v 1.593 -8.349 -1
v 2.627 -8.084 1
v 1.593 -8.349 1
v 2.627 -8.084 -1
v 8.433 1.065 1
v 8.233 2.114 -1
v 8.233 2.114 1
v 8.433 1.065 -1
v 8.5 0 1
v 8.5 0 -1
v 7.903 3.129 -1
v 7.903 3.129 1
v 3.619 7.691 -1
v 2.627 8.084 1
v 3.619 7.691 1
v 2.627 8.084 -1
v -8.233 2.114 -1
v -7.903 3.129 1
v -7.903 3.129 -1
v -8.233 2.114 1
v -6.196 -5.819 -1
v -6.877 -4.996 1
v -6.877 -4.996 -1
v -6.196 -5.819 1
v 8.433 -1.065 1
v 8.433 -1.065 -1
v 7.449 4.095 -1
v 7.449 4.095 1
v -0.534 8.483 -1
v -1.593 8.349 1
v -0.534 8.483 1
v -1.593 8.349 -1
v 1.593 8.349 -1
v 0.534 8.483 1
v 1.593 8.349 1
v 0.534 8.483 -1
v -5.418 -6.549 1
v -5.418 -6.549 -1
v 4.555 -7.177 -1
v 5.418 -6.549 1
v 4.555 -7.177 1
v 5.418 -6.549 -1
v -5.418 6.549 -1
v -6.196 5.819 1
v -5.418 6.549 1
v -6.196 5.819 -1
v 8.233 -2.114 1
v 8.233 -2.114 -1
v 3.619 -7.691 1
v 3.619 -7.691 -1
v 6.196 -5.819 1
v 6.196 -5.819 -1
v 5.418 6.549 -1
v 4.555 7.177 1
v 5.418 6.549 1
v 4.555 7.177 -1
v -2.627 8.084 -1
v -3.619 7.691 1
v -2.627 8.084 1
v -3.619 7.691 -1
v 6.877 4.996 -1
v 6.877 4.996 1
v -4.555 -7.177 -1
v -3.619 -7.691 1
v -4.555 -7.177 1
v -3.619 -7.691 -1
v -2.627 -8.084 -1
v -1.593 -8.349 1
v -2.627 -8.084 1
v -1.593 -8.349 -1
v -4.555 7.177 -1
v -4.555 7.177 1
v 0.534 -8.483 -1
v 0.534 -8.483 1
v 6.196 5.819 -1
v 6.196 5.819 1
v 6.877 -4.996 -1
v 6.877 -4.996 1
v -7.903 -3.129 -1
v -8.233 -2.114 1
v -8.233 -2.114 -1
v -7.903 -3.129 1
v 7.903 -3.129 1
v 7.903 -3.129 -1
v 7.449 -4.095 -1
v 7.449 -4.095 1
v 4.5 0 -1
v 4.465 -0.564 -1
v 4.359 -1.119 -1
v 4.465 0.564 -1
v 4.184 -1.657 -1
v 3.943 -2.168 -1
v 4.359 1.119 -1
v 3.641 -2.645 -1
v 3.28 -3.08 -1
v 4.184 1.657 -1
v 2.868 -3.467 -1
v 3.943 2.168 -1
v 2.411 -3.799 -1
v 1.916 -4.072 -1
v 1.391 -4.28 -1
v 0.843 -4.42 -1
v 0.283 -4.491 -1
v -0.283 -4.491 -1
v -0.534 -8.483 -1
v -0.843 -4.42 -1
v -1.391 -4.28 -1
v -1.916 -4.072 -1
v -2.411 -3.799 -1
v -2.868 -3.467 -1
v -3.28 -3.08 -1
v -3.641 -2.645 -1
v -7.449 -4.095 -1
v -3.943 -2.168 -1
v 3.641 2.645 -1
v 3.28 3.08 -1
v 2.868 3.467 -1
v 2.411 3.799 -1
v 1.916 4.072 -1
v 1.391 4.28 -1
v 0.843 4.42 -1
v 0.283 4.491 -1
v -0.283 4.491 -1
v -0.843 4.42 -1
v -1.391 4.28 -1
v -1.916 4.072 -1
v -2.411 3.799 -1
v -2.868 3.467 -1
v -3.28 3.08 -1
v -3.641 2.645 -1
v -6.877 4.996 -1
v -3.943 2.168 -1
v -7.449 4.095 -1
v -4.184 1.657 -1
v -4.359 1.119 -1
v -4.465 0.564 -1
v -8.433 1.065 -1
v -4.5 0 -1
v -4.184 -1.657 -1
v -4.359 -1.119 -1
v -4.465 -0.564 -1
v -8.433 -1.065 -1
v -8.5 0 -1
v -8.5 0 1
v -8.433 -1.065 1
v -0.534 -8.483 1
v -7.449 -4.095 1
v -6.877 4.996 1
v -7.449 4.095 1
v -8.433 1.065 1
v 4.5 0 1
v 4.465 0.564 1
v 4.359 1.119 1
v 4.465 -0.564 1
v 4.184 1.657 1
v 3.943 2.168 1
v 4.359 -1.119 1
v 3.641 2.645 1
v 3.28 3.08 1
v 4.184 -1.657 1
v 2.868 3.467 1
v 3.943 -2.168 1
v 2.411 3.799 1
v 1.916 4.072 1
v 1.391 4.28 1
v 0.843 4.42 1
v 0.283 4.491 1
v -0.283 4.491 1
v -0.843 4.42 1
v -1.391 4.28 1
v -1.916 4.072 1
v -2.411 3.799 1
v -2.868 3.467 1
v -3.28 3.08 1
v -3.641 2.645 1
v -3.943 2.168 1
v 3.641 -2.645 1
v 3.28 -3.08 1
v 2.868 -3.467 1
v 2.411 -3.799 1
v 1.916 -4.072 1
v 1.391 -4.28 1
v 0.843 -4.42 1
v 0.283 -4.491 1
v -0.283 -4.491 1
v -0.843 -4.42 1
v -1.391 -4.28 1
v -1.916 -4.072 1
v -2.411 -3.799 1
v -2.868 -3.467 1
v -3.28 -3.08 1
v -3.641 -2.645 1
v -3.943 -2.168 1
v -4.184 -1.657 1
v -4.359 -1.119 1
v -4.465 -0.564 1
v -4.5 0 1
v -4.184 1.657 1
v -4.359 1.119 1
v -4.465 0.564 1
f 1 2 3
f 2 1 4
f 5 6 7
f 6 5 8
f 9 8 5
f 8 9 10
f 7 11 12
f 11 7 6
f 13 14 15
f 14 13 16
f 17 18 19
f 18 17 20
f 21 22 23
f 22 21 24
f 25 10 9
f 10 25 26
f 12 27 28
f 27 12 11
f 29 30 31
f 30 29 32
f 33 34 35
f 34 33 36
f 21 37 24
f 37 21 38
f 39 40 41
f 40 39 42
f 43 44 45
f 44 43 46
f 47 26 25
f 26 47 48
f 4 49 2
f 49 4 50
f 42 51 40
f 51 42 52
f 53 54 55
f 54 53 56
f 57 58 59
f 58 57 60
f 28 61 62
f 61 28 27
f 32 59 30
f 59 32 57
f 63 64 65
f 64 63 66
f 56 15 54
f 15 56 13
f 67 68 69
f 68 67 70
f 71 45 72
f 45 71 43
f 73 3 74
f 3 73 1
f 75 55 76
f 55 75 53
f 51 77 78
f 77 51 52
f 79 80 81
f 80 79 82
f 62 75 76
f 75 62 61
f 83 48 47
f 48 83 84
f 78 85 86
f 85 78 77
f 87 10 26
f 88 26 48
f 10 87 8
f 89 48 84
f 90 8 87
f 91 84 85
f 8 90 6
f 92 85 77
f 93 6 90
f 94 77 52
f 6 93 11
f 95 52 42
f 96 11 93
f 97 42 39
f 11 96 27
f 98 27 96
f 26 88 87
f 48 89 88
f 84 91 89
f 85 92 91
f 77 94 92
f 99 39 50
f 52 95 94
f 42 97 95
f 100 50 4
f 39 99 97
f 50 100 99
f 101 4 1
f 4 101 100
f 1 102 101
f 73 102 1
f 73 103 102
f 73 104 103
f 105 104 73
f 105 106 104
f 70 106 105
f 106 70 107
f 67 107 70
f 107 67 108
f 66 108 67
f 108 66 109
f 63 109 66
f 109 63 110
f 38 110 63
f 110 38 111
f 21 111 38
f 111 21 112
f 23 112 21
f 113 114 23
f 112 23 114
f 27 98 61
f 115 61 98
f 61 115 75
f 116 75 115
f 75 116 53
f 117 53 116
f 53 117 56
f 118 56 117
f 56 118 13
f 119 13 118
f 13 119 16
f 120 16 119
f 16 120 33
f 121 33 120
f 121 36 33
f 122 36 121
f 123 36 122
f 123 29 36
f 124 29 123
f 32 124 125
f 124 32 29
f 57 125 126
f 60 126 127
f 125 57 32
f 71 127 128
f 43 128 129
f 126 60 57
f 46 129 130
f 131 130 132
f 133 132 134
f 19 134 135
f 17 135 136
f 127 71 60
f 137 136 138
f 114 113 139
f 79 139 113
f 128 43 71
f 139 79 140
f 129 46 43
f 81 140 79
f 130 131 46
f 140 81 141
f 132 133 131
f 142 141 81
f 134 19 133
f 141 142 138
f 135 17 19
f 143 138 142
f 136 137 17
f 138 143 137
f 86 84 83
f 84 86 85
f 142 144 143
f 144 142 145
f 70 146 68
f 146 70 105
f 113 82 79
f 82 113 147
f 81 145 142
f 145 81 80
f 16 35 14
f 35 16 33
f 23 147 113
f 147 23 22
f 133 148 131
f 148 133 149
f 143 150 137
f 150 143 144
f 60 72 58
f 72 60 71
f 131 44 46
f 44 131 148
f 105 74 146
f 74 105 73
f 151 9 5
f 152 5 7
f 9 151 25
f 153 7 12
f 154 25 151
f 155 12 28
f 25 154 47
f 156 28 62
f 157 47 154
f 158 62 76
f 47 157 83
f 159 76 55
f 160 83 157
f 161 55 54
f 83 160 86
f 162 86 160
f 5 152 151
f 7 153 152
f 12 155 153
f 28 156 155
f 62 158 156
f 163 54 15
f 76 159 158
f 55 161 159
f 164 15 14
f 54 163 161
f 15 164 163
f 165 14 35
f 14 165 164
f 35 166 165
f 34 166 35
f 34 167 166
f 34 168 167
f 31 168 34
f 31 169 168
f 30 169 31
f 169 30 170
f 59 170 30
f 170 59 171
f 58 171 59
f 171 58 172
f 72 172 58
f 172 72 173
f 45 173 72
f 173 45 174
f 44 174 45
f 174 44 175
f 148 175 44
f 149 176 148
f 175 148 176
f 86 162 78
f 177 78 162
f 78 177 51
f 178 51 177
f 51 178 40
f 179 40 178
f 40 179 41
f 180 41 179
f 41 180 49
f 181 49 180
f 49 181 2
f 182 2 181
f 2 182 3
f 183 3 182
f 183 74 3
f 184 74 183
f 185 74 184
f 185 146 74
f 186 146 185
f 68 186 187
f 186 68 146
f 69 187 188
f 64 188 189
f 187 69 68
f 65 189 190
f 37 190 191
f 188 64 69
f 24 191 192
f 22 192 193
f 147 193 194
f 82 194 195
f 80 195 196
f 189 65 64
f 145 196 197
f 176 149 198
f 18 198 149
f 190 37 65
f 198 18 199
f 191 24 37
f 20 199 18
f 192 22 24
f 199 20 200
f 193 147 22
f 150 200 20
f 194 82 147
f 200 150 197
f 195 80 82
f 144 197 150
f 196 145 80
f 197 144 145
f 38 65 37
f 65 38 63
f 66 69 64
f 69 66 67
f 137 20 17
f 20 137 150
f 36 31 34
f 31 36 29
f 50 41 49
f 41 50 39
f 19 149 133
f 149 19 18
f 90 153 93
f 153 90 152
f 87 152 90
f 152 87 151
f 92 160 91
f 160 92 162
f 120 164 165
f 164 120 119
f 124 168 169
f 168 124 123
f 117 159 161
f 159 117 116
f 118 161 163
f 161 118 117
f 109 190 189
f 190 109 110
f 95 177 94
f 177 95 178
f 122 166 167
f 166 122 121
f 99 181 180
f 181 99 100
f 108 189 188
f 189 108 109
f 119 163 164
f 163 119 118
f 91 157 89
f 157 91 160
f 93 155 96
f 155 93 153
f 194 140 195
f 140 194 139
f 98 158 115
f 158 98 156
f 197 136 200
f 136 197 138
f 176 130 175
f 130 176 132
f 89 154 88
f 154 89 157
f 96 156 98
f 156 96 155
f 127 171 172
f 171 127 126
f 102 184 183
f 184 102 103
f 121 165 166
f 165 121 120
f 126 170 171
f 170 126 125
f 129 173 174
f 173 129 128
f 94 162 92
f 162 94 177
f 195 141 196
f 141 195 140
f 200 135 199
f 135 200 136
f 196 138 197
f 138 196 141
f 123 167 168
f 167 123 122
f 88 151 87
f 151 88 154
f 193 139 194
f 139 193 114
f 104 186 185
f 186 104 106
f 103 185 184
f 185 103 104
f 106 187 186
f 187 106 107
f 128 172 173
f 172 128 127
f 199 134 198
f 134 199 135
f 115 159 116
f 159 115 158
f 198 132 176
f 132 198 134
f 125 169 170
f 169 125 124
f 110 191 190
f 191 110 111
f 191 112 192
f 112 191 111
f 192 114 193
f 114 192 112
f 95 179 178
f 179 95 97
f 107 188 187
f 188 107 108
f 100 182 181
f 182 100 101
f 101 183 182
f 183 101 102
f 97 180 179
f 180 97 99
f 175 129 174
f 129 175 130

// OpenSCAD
$fn = 50;


difference() {
	union() {
		translate(v = [0, 0, -1.0000000000]) {
			cylinder(h = 2, r = 8.5000000000);
		}
	}
	union() {
		translate(v = [0, 0, -100.0000000000]) {
			cylinder(h = 200, r = 4.5000000000);
		}
	}
}
